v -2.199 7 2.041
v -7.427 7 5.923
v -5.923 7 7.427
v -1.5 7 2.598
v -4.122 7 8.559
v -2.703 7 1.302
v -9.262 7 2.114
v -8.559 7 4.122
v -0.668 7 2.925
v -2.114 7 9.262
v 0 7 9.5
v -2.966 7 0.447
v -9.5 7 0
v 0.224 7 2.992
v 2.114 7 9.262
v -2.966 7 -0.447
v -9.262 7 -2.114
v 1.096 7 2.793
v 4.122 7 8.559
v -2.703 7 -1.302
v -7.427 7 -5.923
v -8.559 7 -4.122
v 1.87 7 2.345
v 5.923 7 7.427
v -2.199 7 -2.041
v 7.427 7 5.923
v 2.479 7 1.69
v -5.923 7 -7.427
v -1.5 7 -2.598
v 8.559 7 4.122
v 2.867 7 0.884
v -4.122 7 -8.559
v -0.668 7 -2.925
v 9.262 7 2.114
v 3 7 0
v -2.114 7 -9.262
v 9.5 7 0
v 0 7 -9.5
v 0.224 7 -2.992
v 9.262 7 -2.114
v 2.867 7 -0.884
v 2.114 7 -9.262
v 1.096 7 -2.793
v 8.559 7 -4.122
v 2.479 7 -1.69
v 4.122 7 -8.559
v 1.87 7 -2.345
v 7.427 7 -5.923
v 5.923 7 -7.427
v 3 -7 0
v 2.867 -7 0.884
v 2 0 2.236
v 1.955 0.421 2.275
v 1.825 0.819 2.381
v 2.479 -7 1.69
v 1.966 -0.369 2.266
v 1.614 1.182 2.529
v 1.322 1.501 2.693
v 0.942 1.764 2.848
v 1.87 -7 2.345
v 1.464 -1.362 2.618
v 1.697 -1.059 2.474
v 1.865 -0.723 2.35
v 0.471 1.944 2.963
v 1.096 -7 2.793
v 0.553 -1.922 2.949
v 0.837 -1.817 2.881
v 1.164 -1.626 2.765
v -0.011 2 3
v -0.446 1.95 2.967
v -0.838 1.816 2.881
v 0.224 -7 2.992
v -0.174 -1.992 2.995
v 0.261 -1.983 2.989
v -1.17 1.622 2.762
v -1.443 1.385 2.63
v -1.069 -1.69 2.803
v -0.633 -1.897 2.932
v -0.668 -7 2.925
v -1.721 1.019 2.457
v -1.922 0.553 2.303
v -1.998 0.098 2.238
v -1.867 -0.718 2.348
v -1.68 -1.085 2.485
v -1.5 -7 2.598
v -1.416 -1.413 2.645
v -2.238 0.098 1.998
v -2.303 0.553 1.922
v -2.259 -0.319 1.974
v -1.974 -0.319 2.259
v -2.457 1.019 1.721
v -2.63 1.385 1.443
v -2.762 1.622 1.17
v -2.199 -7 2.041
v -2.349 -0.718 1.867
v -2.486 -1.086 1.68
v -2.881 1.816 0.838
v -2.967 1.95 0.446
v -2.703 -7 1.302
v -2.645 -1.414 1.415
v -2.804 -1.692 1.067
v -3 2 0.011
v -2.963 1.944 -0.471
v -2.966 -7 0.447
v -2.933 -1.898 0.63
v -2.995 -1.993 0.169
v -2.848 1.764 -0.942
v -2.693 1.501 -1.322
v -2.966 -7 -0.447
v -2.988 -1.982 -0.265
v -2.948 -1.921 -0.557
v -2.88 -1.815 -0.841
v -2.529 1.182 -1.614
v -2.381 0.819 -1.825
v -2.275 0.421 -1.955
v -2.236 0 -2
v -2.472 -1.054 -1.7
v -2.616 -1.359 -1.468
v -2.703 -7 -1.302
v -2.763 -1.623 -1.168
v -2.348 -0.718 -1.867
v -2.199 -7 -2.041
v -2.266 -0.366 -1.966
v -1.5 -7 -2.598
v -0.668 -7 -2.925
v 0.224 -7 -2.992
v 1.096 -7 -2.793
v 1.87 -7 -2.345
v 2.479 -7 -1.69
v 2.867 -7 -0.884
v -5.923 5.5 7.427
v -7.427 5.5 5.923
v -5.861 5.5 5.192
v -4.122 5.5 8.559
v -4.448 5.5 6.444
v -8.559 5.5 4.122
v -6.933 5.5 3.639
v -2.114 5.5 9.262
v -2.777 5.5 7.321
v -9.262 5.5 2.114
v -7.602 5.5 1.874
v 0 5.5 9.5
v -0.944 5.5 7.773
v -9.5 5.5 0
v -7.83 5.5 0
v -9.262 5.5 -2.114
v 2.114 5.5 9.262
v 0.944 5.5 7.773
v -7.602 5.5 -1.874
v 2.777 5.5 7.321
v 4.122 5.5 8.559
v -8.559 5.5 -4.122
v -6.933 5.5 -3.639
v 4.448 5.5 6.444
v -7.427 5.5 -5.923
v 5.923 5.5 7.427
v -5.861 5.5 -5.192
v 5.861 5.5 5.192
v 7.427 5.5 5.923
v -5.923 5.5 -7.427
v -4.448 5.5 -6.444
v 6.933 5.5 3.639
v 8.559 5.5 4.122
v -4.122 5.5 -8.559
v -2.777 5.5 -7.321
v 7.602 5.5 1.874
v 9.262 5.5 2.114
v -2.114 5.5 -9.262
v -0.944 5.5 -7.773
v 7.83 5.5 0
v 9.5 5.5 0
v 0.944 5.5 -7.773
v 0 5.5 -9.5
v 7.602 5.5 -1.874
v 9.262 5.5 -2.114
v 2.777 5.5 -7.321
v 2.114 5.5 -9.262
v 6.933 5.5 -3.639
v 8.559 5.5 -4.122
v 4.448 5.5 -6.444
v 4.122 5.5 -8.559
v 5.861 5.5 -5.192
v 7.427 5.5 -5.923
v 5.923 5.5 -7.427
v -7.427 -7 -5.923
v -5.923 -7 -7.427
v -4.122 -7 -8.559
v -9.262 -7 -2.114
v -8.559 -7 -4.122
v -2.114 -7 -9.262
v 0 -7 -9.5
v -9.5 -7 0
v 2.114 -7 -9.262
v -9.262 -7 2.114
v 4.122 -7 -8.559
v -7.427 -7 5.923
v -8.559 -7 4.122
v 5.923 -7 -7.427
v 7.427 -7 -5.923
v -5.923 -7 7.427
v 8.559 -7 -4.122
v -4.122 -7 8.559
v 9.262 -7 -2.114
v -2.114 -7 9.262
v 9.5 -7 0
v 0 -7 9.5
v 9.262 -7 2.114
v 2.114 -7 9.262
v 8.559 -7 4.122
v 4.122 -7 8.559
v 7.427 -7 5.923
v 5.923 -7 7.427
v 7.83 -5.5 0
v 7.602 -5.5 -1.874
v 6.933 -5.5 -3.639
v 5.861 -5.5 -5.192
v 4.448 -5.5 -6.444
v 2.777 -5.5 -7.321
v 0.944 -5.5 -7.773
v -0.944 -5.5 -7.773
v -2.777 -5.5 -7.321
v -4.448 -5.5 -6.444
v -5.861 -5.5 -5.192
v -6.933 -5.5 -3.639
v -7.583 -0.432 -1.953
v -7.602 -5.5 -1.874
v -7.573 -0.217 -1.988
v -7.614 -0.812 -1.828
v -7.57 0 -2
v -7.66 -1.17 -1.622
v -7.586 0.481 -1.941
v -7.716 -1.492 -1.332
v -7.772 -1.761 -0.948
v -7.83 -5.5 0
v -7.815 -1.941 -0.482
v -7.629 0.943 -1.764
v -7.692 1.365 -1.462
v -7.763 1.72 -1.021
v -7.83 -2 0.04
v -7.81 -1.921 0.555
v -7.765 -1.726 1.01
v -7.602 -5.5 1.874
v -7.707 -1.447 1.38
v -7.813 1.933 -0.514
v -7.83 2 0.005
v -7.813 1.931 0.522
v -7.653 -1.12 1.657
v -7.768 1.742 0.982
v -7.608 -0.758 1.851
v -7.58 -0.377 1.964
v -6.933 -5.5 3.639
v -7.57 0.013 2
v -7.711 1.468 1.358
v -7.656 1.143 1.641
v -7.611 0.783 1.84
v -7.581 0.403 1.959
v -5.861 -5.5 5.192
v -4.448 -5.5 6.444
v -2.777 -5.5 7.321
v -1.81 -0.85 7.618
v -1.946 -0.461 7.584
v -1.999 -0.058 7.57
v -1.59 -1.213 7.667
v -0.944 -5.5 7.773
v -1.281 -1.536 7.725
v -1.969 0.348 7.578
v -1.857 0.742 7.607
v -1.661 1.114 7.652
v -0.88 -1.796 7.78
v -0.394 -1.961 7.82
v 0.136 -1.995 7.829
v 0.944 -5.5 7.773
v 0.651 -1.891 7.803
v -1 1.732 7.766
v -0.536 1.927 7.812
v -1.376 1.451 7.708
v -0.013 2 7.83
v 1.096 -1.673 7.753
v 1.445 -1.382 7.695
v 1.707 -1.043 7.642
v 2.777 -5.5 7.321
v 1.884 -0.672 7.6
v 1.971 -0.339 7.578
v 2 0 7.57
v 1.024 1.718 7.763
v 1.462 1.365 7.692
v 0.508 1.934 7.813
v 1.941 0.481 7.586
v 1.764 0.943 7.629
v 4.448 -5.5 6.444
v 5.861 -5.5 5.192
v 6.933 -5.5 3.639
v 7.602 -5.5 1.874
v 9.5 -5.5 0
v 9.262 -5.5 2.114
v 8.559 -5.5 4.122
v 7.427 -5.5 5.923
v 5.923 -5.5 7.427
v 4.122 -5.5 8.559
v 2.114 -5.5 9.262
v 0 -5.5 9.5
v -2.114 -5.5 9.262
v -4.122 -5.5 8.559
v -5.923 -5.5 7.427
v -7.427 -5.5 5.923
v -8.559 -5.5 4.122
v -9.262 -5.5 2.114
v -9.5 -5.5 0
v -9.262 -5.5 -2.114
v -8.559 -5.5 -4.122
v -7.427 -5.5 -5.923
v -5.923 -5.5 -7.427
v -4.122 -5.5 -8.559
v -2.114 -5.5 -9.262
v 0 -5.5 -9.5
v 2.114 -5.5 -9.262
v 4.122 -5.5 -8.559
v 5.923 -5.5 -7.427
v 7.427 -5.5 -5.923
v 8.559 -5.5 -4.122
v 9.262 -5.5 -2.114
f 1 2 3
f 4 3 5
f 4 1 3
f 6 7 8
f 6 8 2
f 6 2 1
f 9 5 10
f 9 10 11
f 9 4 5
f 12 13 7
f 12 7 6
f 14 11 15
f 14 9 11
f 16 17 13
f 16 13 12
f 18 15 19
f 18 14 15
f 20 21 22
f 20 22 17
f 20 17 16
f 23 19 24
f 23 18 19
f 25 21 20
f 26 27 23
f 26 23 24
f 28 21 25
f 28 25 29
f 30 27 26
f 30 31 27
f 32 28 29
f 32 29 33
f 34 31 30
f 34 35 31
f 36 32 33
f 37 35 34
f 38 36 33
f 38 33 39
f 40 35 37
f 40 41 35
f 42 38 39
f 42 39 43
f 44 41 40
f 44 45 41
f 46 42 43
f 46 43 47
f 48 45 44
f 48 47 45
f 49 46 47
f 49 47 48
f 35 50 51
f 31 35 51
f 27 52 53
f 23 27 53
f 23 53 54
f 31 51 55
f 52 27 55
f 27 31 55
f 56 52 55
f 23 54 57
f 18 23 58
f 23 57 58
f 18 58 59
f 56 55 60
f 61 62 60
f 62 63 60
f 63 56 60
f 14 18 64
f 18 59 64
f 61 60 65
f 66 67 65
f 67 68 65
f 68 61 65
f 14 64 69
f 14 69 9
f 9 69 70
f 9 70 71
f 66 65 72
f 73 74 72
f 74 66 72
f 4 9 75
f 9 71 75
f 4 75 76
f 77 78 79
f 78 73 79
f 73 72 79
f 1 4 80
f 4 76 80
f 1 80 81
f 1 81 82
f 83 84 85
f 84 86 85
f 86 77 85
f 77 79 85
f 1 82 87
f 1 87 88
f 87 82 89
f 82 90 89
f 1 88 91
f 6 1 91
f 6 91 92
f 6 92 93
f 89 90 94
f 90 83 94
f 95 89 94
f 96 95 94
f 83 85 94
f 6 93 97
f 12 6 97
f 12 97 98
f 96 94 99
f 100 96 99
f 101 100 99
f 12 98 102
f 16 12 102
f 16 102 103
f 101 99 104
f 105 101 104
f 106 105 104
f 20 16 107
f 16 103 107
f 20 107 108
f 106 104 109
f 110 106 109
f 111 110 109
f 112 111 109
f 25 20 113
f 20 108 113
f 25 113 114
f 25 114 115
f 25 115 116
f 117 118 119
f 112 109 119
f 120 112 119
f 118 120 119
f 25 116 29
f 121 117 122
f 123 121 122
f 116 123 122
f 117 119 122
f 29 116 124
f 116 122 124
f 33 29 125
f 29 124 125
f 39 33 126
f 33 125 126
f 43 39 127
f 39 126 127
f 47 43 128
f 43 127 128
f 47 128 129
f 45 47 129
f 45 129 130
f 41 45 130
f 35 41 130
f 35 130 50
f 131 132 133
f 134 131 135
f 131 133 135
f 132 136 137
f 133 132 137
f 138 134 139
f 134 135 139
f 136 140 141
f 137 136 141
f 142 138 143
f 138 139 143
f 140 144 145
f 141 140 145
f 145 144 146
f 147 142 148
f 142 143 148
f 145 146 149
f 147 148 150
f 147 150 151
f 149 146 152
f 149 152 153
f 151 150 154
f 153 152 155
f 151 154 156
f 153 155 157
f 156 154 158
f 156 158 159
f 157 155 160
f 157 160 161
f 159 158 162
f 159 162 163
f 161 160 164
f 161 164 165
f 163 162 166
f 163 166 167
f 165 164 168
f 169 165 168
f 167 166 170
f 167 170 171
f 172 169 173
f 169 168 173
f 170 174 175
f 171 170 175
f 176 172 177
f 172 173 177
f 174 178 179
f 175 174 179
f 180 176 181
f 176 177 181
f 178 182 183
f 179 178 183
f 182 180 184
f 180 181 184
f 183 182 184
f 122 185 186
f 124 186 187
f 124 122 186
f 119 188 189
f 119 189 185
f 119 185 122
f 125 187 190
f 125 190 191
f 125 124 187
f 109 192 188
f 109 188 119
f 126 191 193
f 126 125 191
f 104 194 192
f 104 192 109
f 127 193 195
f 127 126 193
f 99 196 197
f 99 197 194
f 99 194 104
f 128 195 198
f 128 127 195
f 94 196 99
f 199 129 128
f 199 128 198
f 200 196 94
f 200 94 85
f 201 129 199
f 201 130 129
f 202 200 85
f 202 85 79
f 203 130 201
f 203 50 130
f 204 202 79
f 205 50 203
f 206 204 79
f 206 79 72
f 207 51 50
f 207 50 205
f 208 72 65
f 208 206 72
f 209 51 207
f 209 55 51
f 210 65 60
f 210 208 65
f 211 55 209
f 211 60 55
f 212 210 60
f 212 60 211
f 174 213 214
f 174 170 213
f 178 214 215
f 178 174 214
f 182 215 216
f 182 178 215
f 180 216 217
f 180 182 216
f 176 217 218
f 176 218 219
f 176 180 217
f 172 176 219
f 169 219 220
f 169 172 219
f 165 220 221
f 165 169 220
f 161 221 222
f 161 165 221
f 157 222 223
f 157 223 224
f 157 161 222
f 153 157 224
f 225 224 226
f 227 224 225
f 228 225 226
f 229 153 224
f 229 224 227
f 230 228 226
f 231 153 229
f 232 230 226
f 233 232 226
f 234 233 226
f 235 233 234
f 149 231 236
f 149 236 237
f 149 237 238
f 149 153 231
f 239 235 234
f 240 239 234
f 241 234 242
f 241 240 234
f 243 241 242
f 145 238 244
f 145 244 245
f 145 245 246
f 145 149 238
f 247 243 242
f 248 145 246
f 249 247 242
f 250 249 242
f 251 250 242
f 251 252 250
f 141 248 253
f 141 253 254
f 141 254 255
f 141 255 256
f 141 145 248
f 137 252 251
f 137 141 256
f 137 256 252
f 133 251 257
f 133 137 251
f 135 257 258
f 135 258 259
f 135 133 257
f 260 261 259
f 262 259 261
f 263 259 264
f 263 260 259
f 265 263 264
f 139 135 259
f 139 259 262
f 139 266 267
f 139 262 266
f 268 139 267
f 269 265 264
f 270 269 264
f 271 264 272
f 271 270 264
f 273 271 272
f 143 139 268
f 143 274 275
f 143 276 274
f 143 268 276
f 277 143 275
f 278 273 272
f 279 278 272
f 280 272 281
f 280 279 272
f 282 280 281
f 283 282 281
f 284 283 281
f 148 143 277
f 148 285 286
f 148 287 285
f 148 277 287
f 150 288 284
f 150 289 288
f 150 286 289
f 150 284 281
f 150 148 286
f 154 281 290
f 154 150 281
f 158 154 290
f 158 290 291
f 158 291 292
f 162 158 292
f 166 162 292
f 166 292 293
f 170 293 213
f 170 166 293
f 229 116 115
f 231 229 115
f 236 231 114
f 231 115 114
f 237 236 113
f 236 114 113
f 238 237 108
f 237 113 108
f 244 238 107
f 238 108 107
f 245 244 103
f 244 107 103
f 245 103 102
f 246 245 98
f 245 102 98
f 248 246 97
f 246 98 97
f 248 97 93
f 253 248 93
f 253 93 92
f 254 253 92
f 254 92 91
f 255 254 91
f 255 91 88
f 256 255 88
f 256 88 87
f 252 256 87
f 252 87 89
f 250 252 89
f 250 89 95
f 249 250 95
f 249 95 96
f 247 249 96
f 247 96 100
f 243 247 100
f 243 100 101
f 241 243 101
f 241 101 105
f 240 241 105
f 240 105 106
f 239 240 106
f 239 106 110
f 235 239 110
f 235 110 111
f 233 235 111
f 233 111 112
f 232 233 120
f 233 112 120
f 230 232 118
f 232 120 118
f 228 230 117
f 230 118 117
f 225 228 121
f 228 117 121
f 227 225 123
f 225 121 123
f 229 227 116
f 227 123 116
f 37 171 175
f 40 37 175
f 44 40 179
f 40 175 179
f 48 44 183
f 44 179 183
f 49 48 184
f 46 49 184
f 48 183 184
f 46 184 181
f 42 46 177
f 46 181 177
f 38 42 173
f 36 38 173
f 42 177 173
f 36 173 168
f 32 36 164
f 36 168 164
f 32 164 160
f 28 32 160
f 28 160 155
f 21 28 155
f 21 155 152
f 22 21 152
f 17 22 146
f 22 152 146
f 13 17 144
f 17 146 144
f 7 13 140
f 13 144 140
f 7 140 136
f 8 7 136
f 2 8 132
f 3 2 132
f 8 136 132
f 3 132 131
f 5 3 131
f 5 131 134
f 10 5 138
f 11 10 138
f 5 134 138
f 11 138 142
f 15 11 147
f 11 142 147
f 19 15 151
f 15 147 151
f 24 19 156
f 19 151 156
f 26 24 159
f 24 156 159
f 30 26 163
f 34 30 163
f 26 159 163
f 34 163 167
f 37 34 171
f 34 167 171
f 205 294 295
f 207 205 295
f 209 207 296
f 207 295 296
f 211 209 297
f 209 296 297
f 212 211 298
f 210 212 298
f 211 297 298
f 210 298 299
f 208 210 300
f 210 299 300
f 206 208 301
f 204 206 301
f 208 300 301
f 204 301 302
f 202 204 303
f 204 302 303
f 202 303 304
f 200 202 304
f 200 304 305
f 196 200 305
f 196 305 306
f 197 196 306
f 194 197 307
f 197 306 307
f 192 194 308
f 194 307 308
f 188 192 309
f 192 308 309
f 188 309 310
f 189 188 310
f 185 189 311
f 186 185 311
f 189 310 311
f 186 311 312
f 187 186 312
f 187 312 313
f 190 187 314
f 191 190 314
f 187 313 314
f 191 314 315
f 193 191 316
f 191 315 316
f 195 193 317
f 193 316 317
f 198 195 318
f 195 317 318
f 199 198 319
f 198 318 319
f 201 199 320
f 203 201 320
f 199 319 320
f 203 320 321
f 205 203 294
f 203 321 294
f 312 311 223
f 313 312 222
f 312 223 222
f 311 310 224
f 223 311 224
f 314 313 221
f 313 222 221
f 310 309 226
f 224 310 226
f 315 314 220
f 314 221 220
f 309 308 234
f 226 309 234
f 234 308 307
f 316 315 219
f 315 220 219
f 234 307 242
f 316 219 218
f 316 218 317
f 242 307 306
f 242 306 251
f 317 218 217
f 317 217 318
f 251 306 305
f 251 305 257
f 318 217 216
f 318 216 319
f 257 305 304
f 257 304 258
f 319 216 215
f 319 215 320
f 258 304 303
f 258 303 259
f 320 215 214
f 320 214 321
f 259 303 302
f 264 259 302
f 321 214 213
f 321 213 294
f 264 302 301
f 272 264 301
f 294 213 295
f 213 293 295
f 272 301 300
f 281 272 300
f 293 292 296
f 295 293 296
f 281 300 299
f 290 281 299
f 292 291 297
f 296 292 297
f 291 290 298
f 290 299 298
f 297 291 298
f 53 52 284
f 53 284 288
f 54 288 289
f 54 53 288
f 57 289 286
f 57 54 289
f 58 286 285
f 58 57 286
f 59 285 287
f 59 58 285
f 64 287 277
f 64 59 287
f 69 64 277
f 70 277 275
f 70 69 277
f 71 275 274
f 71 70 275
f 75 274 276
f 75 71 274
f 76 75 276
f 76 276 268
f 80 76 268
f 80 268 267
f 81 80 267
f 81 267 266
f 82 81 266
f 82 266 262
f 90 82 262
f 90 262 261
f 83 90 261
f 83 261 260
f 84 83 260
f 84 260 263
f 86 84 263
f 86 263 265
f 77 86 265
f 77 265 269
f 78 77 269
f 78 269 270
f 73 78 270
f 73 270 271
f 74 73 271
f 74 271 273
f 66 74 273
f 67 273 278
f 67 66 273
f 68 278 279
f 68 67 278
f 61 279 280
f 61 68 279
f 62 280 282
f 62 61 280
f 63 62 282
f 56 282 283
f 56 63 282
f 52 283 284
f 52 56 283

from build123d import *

# Parameters (mm, degrees)
EXTRUDE_1_DEPTH      = 5.5
EXTRUDE_1_DEPTH_BACK = 5.5
SKETCH_1_R           = 7.83
SKETCH_3_R           = 9.5
EXTRUDE_3_DEPTH      = 1.5
EXTRUDE_START        = 1.5
SKETCH_4_R           = 9.5
EXTRUDE_4_DEPTH      = 1.5
SKETCH_5_R           = 3
CUT_EXTRUDE_1_DEPTH  = 20.403607912
SKETCH_6_R           = 2
CUT_EXTRUDE_2_DEPTH  = 16.149257408
SKETCH_7_R           = 2
CUT_EXTRUDE_3_DEPTH  = 16.149257454


with BuildPart() as part:
    # 草圖1 → 填料-伸長1 (new, two sides: drawn at the far end of the back side and taken through both)
    with BuildSketch(Plane(origin=(0, 0, 0), x_dir=(1, 0, 0), z_dir=(0, 1, 0)).offset(-EXTRUDE_1_DEPTH_BACK)):
        Circle(SKETCH_1_R)
    extrude(amount=EXTRUDE_1_DEPTH + EXTRUDE_1_DEPTH_BACK)

    # 草圖3 → 填料-伸長3 (add)
    with BuildSketch(Plane.XZ.offset(5.5)):
        Circle(SKETCH_3_R)
    extrude(amount=EXTRUDE_3_DEPTH)

    # 草圖4 → 填料-伸長4 (add)
    with BuildSketch(Plane(origin=(0, 5.5, 0), x_dir=(1, 0, 0), z_dir=(0, 1, 0)).offset(EXTRUDE_START)):
        Circle(SKETCH_4_R)
    extrude(amount=-EXTRUDE_4_DEPTH)

    # 草圖5 → 除料-伸長1 (cut, through all)
    with BuildSketch(Plane.XZ.offset(7)):
        Circle(SKETCH_5_R)
    extrude(amount=-CUT_EXTRUDE_1_DEPTH, mode=Mode.SUBTRACT)

    # 草圖6 → 除料-伸長2 (cut, through all)
    with BuildSketch(Plane.XY):
        Circle(SKETCH_6_R)
    extrude(amount=CUT_EXTRUDE_2_DEPTH, mode=Mode.SUBTRACT)

    # 草圖7 → 除料-伸長3 (cut, through all)
    with BuildSketch(Plane(origin=(0, 0, 0), x_dir=(0, 0, -1), z_dir=(1, 0, 0))):
        Circle(SKETCH_7_R)
    extrude(amount=-CUT_EXTRUDE_3_DEPTH, mode=Mode.SUBTRACT)


solid = part.part
